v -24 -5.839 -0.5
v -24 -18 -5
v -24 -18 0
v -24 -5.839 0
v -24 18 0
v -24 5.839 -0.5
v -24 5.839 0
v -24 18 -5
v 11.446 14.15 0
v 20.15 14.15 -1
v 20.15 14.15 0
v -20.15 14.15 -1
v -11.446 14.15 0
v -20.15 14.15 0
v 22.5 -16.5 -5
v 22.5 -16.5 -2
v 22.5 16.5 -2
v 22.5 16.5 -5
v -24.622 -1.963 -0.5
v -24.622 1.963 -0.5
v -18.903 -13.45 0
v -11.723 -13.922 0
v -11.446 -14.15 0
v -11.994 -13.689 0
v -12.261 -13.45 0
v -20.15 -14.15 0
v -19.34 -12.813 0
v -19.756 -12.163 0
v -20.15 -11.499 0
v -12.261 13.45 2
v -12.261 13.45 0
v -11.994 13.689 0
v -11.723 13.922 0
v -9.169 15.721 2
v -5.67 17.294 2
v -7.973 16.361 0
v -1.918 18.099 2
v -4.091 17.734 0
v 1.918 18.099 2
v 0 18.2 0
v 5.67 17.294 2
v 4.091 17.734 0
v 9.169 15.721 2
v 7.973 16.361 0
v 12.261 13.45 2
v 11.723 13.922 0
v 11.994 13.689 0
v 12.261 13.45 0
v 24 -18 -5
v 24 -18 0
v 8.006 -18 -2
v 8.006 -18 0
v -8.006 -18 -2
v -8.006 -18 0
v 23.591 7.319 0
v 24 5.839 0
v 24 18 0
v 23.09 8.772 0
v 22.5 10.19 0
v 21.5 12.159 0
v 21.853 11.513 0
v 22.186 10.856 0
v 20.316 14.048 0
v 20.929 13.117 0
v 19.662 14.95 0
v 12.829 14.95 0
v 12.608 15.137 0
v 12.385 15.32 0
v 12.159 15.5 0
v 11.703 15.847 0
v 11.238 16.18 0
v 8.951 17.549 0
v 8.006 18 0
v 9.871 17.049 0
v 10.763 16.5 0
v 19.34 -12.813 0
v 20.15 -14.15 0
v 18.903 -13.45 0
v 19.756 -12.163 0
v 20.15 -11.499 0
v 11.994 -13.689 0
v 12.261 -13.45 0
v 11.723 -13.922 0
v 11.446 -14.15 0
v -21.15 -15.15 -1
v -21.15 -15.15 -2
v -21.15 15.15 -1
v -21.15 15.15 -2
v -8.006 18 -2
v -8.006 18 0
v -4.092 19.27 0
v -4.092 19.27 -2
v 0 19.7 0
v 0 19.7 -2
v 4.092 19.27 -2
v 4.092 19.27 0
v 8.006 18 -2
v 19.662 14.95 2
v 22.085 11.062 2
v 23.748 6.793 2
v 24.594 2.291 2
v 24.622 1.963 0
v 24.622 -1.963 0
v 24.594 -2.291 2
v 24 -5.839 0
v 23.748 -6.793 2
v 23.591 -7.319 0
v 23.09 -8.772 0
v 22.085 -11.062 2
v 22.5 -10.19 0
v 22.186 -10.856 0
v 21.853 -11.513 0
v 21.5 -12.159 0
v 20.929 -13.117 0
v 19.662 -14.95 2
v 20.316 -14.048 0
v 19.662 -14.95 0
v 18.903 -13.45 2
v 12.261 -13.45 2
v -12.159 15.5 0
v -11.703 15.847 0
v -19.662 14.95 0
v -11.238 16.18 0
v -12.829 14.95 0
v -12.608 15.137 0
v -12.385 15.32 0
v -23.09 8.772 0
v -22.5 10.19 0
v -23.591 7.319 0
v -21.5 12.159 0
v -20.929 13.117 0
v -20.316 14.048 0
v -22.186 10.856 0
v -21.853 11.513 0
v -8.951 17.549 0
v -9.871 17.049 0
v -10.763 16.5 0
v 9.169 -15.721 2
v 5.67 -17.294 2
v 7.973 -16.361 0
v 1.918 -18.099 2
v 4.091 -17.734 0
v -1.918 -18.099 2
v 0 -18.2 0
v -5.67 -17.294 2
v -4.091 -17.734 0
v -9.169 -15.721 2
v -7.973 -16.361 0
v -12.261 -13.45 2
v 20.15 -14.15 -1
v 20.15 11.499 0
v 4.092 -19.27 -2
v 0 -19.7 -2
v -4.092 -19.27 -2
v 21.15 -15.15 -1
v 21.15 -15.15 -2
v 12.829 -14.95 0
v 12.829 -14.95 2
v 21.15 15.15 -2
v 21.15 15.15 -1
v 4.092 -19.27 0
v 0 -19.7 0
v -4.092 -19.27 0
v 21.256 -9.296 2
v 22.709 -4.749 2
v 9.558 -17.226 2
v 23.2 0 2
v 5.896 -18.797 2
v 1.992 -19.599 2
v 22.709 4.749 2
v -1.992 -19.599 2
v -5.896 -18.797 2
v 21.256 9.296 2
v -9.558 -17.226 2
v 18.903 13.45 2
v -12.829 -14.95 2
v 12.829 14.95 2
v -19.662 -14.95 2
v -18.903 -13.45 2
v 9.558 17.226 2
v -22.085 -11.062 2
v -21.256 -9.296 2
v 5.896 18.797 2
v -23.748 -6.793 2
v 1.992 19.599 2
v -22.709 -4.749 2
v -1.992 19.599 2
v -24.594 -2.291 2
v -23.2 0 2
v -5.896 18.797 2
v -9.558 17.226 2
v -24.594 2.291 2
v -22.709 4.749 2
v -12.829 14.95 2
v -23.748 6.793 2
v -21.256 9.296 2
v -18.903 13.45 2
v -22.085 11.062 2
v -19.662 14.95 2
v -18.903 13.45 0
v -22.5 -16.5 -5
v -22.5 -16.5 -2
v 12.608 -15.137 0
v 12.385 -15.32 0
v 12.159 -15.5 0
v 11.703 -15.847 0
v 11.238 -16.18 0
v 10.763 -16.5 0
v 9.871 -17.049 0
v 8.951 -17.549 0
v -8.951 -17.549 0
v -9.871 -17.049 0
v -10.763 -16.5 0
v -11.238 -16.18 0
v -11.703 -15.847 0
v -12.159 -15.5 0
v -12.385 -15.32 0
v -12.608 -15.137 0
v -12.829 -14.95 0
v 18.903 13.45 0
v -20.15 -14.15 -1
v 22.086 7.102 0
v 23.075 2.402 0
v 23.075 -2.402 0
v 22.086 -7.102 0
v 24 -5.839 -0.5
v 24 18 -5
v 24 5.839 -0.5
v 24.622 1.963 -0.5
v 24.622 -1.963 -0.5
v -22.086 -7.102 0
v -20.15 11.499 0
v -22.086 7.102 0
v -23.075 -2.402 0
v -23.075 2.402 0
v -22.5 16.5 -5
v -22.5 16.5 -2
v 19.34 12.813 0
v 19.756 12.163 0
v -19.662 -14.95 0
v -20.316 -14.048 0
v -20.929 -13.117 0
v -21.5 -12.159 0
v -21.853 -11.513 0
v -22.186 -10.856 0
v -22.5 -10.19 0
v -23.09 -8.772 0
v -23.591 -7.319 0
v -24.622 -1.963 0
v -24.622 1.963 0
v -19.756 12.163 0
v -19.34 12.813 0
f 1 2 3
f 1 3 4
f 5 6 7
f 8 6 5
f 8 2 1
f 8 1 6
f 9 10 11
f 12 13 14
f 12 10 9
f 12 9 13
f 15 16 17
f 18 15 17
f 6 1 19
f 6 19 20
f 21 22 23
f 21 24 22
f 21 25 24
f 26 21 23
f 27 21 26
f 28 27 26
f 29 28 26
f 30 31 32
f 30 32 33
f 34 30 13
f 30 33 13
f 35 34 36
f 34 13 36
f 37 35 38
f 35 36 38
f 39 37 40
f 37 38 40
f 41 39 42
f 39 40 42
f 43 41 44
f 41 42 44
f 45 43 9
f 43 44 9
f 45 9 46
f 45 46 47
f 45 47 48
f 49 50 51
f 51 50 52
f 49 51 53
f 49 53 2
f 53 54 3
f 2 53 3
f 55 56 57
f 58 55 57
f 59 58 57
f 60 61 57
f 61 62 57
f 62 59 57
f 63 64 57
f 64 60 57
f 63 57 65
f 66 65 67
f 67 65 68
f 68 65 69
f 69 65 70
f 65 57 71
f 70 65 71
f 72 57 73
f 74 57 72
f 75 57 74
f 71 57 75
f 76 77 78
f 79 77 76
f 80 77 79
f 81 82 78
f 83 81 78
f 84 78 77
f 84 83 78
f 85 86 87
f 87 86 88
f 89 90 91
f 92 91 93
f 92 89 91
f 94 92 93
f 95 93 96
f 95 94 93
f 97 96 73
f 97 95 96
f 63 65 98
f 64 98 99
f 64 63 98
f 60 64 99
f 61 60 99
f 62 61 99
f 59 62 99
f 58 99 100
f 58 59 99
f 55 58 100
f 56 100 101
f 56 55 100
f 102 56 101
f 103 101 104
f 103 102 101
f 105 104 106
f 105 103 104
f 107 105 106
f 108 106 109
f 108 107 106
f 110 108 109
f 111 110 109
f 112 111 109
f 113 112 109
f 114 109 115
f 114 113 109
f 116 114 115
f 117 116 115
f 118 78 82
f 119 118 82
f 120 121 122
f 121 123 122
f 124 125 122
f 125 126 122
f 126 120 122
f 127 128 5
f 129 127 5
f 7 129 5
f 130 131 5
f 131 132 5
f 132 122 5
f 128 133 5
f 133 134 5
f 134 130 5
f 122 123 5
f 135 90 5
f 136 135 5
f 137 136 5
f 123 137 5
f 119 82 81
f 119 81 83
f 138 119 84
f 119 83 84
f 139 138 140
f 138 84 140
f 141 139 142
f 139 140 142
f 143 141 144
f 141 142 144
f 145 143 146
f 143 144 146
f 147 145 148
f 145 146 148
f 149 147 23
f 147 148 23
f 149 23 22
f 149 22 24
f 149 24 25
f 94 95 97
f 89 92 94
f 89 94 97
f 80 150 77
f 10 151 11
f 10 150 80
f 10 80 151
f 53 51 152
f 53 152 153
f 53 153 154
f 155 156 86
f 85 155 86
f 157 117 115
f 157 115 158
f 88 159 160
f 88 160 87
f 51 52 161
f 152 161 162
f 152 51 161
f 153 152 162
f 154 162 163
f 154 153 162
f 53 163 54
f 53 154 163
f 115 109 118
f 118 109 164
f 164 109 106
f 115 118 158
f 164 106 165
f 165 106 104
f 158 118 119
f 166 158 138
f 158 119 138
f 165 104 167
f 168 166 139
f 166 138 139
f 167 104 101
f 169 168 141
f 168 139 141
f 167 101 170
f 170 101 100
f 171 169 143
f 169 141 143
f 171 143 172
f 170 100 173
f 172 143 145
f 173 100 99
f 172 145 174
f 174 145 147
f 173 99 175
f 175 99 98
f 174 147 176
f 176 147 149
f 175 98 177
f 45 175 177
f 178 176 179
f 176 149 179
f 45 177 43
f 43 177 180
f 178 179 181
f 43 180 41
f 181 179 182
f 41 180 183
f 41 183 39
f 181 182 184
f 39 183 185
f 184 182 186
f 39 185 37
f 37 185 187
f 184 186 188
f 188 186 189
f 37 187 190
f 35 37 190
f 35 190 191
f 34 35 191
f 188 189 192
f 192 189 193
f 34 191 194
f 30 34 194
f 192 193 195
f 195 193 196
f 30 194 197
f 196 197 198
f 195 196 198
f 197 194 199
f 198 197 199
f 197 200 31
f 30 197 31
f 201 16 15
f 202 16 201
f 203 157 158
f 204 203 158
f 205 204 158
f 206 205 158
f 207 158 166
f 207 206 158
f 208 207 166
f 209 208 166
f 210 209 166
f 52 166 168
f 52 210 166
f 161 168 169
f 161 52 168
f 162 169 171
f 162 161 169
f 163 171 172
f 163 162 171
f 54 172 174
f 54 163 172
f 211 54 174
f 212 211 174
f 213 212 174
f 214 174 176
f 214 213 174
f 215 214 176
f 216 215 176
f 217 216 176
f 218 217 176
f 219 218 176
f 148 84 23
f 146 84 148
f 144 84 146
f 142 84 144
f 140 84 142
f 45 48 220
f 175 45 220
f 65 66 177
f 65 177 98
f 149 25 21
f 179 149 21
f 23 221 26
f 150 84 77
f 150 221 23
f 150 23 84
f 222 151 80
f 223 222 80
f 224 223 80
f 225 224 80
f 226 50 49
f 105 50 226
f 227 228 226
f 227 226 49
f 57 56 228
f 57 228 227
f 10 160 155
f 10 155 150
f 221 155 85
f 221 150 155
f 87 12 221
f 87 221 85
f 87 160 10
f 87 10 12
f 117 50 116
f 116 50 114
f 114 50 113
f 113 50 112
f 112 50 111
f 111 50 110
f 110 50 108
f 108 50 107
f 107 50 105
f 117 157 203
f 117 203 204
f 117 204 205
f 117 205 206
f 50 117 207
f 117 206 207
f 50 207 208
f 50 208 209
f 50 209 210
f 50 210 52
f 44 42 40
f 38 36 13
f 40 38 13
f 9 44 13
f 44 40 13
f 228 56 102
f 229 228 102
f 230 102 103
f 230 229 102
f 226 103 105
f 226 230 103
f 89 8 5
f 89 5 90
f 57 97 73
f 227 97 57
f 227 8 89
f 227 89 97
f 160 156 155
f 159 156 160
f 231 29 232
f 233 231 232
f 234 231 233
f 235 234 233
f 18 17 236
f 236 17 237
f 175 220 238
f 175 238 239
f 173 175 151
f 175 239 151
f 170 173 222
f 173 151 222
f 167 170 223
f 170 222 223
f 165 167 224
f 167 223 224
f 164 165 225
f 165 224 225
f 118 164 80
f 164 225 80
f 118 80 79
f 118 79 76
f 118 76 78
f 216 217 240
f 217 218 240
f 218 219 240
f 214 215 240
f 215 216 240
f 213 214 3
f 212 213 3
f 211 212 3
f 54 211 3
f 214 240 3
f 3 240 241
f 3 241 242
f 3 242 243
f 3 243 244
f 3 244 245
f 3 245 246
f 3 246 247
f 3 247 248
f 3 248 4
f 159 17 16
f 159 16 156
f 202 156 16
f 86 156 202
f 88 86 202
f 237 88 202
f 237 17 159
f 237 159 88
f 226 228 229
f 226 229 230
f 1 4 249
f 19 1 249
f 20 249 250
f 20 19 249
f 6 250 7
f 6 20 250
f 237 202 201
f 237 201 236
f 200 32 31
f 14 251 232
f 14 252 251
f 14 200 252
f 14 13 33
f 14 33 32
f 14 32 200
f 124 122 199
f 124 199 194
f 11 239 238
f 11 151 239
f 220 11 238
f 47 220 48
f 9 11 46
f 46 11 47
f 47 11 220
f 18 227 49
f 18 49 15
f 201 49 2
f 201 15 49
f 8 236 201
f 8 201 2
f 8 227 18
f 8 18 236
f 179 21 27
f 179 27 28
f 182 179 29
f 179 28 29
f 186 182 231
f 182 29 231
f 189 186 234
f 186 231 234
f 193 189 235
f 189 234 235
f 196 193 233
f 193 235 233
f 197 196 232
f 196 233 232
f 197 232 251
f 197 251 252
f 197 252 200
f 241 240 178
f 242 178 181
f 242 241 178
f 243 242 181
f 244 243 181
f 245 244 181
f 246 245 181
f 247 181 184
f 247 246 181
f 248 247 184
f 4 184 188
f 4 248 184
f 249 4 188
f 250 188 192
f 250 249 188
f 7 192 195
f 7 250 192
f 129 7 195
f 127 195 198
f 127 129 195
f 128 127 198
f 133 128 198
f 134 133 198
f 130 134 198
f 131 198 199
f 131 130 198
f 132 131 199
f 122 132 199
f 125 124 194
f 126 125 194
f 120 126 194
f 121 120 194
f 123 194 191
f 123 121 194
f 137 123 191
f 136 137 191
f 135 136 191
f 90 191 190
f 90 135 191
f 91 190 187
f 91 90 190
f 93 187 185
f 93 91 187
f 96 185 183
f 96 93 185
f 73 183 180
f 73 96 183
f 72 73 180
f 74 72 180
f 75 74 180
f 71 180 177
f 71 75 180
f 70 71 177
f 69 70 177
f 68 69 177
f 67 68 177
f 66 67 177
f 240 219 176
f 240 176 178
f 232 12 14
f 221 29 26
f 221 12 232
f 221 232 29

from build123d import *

# Parameters (mm, degrees)
EXTRUDE_1_DEPTH     = 2
EXTRUDE_START       = 2
SKETCH_3_W          = 40.3
SKETCH_3_H          = 28.3
EXTRUDE_2_DEPTH     = 2
SKETCH_4_W          = 48
SKETCH_4_H          = 36
SKETCH_4_W_2        = 45
SKETCH_4_H_2        = 33
EXTRUDE_3_DEPTH     = 3
EXTRUDE_4_DEPTH     = 2
CUT_EXTRUDE_1_DEPTH = 1.5
SKETCH_5_W          = 42.3
SKETCH_5_H          = 30.3
CUT_EXTRUDE_2_DEPTH = 1


with BuildPart() as part:
    # 草图1 → 凸台-拉伸1 (new body)
    with BuildSketch(Plane.XY):
        with BuildLine():
            Line((-19.661828501, 14.95), (-12.82916599, 14.95))
            ThreePointArc((-12.82916599, 14.95), (0, 19.7), (12.82916599, 14.95))
            Line((12.82916599, 14.95), (19.661828501, 14.95))
            ThreePointArc((19.661828501, 14.95), (24.7, 0), (19.661828501, -14.95))
            Line((19.661828501, -14.95), (12.82916599, -14.95))
            ThreePointArc((12.82916599, -14.95), (0, -19.7), (-12.82916599, -14.95))
            Line((-12.82916599, -14.95), (-19.661828501, -14.95))
            ThreePointArc((-19.661828501, -14.95), (-24.7, 0), (-19.661828501, 14.95))
        make_face()
        with BuildLine():
            Line((-18.903372715, 13.45), (-12.261219352, 13.45))
            ThreePointArc((-12.261219352, 13.45), (0, 18.2), (12.261219352, 13.45))
            Line((12.261219352, 13.45), (18.903372715, 13.45))
            ThreePointArc((18.903372715, 13.45), (23.2, 0), (18.903372715, -13.45))
            Line((18.903372715, -13.45), (12.261219352, -13.45))
            ThreePointArc((12.261219352, -13.45), (0, -18.2), (-12.261219352, -13.45))
            Line((-12.261219352, -13.45), (-18.903372715, -13.45))
            ThreePointArc((-18.903372715, -13.45), (-23.2, 0), (-18.903372715, 13.45))
        make_face(mode=Mode.SUBTRACT)
    extrude(amount=EXTRUDE_1_DEPTH)

    # 草图3 → 凸台-拉伸2 (add)
    with BuildSketch(Plane(origin=(0, 0, 0), x_dir=(-1, 0, 0), z_dir=(0, 0, -1)).offset(EXTRUDE_START)):
        with BuildLine():
            Line((-21.5, -12.158947323), (-21.5, -15.5))
            Line((-21.5, -15.5), (-12.158947323, -15.5))
            ThreePointArc((-12.158947323, -15.5), (0, -19.7), (12.158947323, -15.5))
            Line((12.158947323, -15.5), (21.5, -15.5))
            Line((21.5, -15.5), (21.5, -12.158947323))
            ThreePointArc((21.5, -12.158947323), (24.7, 0), (21.5, 12.158947323))
            Line((21.5, 12.158947323), (21.5, 15.5))
            Line((21.5, 15.5), (12.158947323, 15.5))
            ThreePointArc((12.158947323, 15.5), (0, 19.7), (-12.158947323, 15.5))
            Line((-12.158947323, 15.5), (-21.5, 15.5))
            Line((-21.5, 15.5), (-21.5, 12.158947323))
            ThreePointArc((-21.5, 12.158947323), (-24.7, 0), (-21.5, -12.158947323))
        make_face()
        Rectangle(SKETCH_3_W, SKETCH_3_H, mode=Mode.SUBTRACT)
    extrude(amount=-EXTRUDE_2_DEPTH)

    # 草图4 → 凸台-拉伸3 (add)
    with BuildSketch(Plane(origin=(0, 0, -2), x_dir=(-1, 0, 0), z_dir=(0, 0, -1))):
        Rectangle(SKETCH_4_W, SKETCH_4_H)
        Rectangle(SKETCH_4_W_2, SKETCH_4_H_2, mode=Mode.SUBTRACT)
    extrude(amount=EXTRUDE_3_DEPTH)

    # 草图4<2> → 凸台-拉伸4 (add)
    with BuildSketch(Plane(origin=(0, 0, -2), x_dir=(-1, 0, 0), z_dir=(0, 0, -1))):
        with BuildLine():
            ThreePointArc((-21.5, -12.158947323), (-22.968434744, -9.085208055), (-24, -5.838664231))
            Line((-24, -5.838664231), (-24, -18))
            Line((-24, -18), (-8.005623024, -18))
            ThreePointArc((-8.005623024, -18), (-10.159477069, -16.87824119), (-12.158947323, -15.5))
            Line((-12.158947323, -15.5), (-21.5, -15.5))
            Line((-21.5, -15.5), (-21.5, -12.158947323))
        make_face()
        with BuildLine():
            ThreePointArc((12.158947323, -15.5), (10.159477069, -16.87824119), (8.005623024, -18))
            Line((8.005623024, -18), (24, -18))
            Line((24, -18), (24, -5.838664231))
            ThreePointArc((24, -5.838664231), (22.968434744, -9.085208055), (21.5, -12.158947323))
            Line((21.5, -12.158947323), (21.5, -15.5))
            Line((21.5, -15.5), (12.158947323, -15.5))
        make_face()
        with BuildLine():
            ThreePointArc((-24, 5.838664231), (-22.968434744, 9.085208055), (-21.5, 12.158947323))
            Line((-21.5, 12.158947323), (-21.5, 15.5))
            Line((-21.5, 15.5), (-12.158947323, 15.5))
            ThreePointArc((-12.158947323, 15.5), (-10.159477069, 16.87824119), (-8.005623024, 18))
            Line((-8.005623024, 18), (-24, 18))
            Line((-24, 18), (-24, 5.838664231))
        make_face()
        with BuildLine():
            ThreePointArc((21.5, 12.158947323), (22.968434744, 9.085208055), (24, 5.838664231))
            Line((24, 5.838664231), (24, 18))
            Line((24, 18), (8.005623024, 18))
            ThreePointArc((8.005623024, 18), (10.159477069, 16.87824119), (12.158947323, 15.5))
            Line((12.158947323, 15.5), (21.5, 15.5))
            Line((21.5, 15.5), (21.5, 12.158947323))
        make_face()
    extrude(amount=-EXTRUDE_4_DEPTH)

    # 草图4<3> → 切除-拉伸1 (cut)
    with BuildSketch(Plane(origin=(0, 0, -2), x_dir=(-1, 0, 0), z_dir=(0, 0, -1))):
        with BuildLine():
            ThreePointArc((-24, 5.838664231), (-24.7, 0), (-24, -5.838664231))
            Line((-24, -5.838664231), (-24, 5.838664231))
        make_face()
        with BuildLine():
            Line((24, 5.838664231), (24, -5.838664231))
            ThreePointArc((24, -5.838664231), (24.7, 0), (24, 5.838664231))
        make_face()
    extrude(amount=-CUT_EXTRUDE_1_DEPTH, mode=Mode.SUBTRACT)

    # 草图5 → 切除-拉伸2 (cut)
    with BuildSketch(Plane(origin=(0, 0, -2), x_dir=(-1, 0, 0), z_dir=(0, 0, -1))):
        Rectangle(SKETCH_5_W, SKETCH_5_H)
    extrude(amount=-CUT_EXTRUDE_2_DEPTH, mode=Mode.SUBTRACT)


solid = part.part
